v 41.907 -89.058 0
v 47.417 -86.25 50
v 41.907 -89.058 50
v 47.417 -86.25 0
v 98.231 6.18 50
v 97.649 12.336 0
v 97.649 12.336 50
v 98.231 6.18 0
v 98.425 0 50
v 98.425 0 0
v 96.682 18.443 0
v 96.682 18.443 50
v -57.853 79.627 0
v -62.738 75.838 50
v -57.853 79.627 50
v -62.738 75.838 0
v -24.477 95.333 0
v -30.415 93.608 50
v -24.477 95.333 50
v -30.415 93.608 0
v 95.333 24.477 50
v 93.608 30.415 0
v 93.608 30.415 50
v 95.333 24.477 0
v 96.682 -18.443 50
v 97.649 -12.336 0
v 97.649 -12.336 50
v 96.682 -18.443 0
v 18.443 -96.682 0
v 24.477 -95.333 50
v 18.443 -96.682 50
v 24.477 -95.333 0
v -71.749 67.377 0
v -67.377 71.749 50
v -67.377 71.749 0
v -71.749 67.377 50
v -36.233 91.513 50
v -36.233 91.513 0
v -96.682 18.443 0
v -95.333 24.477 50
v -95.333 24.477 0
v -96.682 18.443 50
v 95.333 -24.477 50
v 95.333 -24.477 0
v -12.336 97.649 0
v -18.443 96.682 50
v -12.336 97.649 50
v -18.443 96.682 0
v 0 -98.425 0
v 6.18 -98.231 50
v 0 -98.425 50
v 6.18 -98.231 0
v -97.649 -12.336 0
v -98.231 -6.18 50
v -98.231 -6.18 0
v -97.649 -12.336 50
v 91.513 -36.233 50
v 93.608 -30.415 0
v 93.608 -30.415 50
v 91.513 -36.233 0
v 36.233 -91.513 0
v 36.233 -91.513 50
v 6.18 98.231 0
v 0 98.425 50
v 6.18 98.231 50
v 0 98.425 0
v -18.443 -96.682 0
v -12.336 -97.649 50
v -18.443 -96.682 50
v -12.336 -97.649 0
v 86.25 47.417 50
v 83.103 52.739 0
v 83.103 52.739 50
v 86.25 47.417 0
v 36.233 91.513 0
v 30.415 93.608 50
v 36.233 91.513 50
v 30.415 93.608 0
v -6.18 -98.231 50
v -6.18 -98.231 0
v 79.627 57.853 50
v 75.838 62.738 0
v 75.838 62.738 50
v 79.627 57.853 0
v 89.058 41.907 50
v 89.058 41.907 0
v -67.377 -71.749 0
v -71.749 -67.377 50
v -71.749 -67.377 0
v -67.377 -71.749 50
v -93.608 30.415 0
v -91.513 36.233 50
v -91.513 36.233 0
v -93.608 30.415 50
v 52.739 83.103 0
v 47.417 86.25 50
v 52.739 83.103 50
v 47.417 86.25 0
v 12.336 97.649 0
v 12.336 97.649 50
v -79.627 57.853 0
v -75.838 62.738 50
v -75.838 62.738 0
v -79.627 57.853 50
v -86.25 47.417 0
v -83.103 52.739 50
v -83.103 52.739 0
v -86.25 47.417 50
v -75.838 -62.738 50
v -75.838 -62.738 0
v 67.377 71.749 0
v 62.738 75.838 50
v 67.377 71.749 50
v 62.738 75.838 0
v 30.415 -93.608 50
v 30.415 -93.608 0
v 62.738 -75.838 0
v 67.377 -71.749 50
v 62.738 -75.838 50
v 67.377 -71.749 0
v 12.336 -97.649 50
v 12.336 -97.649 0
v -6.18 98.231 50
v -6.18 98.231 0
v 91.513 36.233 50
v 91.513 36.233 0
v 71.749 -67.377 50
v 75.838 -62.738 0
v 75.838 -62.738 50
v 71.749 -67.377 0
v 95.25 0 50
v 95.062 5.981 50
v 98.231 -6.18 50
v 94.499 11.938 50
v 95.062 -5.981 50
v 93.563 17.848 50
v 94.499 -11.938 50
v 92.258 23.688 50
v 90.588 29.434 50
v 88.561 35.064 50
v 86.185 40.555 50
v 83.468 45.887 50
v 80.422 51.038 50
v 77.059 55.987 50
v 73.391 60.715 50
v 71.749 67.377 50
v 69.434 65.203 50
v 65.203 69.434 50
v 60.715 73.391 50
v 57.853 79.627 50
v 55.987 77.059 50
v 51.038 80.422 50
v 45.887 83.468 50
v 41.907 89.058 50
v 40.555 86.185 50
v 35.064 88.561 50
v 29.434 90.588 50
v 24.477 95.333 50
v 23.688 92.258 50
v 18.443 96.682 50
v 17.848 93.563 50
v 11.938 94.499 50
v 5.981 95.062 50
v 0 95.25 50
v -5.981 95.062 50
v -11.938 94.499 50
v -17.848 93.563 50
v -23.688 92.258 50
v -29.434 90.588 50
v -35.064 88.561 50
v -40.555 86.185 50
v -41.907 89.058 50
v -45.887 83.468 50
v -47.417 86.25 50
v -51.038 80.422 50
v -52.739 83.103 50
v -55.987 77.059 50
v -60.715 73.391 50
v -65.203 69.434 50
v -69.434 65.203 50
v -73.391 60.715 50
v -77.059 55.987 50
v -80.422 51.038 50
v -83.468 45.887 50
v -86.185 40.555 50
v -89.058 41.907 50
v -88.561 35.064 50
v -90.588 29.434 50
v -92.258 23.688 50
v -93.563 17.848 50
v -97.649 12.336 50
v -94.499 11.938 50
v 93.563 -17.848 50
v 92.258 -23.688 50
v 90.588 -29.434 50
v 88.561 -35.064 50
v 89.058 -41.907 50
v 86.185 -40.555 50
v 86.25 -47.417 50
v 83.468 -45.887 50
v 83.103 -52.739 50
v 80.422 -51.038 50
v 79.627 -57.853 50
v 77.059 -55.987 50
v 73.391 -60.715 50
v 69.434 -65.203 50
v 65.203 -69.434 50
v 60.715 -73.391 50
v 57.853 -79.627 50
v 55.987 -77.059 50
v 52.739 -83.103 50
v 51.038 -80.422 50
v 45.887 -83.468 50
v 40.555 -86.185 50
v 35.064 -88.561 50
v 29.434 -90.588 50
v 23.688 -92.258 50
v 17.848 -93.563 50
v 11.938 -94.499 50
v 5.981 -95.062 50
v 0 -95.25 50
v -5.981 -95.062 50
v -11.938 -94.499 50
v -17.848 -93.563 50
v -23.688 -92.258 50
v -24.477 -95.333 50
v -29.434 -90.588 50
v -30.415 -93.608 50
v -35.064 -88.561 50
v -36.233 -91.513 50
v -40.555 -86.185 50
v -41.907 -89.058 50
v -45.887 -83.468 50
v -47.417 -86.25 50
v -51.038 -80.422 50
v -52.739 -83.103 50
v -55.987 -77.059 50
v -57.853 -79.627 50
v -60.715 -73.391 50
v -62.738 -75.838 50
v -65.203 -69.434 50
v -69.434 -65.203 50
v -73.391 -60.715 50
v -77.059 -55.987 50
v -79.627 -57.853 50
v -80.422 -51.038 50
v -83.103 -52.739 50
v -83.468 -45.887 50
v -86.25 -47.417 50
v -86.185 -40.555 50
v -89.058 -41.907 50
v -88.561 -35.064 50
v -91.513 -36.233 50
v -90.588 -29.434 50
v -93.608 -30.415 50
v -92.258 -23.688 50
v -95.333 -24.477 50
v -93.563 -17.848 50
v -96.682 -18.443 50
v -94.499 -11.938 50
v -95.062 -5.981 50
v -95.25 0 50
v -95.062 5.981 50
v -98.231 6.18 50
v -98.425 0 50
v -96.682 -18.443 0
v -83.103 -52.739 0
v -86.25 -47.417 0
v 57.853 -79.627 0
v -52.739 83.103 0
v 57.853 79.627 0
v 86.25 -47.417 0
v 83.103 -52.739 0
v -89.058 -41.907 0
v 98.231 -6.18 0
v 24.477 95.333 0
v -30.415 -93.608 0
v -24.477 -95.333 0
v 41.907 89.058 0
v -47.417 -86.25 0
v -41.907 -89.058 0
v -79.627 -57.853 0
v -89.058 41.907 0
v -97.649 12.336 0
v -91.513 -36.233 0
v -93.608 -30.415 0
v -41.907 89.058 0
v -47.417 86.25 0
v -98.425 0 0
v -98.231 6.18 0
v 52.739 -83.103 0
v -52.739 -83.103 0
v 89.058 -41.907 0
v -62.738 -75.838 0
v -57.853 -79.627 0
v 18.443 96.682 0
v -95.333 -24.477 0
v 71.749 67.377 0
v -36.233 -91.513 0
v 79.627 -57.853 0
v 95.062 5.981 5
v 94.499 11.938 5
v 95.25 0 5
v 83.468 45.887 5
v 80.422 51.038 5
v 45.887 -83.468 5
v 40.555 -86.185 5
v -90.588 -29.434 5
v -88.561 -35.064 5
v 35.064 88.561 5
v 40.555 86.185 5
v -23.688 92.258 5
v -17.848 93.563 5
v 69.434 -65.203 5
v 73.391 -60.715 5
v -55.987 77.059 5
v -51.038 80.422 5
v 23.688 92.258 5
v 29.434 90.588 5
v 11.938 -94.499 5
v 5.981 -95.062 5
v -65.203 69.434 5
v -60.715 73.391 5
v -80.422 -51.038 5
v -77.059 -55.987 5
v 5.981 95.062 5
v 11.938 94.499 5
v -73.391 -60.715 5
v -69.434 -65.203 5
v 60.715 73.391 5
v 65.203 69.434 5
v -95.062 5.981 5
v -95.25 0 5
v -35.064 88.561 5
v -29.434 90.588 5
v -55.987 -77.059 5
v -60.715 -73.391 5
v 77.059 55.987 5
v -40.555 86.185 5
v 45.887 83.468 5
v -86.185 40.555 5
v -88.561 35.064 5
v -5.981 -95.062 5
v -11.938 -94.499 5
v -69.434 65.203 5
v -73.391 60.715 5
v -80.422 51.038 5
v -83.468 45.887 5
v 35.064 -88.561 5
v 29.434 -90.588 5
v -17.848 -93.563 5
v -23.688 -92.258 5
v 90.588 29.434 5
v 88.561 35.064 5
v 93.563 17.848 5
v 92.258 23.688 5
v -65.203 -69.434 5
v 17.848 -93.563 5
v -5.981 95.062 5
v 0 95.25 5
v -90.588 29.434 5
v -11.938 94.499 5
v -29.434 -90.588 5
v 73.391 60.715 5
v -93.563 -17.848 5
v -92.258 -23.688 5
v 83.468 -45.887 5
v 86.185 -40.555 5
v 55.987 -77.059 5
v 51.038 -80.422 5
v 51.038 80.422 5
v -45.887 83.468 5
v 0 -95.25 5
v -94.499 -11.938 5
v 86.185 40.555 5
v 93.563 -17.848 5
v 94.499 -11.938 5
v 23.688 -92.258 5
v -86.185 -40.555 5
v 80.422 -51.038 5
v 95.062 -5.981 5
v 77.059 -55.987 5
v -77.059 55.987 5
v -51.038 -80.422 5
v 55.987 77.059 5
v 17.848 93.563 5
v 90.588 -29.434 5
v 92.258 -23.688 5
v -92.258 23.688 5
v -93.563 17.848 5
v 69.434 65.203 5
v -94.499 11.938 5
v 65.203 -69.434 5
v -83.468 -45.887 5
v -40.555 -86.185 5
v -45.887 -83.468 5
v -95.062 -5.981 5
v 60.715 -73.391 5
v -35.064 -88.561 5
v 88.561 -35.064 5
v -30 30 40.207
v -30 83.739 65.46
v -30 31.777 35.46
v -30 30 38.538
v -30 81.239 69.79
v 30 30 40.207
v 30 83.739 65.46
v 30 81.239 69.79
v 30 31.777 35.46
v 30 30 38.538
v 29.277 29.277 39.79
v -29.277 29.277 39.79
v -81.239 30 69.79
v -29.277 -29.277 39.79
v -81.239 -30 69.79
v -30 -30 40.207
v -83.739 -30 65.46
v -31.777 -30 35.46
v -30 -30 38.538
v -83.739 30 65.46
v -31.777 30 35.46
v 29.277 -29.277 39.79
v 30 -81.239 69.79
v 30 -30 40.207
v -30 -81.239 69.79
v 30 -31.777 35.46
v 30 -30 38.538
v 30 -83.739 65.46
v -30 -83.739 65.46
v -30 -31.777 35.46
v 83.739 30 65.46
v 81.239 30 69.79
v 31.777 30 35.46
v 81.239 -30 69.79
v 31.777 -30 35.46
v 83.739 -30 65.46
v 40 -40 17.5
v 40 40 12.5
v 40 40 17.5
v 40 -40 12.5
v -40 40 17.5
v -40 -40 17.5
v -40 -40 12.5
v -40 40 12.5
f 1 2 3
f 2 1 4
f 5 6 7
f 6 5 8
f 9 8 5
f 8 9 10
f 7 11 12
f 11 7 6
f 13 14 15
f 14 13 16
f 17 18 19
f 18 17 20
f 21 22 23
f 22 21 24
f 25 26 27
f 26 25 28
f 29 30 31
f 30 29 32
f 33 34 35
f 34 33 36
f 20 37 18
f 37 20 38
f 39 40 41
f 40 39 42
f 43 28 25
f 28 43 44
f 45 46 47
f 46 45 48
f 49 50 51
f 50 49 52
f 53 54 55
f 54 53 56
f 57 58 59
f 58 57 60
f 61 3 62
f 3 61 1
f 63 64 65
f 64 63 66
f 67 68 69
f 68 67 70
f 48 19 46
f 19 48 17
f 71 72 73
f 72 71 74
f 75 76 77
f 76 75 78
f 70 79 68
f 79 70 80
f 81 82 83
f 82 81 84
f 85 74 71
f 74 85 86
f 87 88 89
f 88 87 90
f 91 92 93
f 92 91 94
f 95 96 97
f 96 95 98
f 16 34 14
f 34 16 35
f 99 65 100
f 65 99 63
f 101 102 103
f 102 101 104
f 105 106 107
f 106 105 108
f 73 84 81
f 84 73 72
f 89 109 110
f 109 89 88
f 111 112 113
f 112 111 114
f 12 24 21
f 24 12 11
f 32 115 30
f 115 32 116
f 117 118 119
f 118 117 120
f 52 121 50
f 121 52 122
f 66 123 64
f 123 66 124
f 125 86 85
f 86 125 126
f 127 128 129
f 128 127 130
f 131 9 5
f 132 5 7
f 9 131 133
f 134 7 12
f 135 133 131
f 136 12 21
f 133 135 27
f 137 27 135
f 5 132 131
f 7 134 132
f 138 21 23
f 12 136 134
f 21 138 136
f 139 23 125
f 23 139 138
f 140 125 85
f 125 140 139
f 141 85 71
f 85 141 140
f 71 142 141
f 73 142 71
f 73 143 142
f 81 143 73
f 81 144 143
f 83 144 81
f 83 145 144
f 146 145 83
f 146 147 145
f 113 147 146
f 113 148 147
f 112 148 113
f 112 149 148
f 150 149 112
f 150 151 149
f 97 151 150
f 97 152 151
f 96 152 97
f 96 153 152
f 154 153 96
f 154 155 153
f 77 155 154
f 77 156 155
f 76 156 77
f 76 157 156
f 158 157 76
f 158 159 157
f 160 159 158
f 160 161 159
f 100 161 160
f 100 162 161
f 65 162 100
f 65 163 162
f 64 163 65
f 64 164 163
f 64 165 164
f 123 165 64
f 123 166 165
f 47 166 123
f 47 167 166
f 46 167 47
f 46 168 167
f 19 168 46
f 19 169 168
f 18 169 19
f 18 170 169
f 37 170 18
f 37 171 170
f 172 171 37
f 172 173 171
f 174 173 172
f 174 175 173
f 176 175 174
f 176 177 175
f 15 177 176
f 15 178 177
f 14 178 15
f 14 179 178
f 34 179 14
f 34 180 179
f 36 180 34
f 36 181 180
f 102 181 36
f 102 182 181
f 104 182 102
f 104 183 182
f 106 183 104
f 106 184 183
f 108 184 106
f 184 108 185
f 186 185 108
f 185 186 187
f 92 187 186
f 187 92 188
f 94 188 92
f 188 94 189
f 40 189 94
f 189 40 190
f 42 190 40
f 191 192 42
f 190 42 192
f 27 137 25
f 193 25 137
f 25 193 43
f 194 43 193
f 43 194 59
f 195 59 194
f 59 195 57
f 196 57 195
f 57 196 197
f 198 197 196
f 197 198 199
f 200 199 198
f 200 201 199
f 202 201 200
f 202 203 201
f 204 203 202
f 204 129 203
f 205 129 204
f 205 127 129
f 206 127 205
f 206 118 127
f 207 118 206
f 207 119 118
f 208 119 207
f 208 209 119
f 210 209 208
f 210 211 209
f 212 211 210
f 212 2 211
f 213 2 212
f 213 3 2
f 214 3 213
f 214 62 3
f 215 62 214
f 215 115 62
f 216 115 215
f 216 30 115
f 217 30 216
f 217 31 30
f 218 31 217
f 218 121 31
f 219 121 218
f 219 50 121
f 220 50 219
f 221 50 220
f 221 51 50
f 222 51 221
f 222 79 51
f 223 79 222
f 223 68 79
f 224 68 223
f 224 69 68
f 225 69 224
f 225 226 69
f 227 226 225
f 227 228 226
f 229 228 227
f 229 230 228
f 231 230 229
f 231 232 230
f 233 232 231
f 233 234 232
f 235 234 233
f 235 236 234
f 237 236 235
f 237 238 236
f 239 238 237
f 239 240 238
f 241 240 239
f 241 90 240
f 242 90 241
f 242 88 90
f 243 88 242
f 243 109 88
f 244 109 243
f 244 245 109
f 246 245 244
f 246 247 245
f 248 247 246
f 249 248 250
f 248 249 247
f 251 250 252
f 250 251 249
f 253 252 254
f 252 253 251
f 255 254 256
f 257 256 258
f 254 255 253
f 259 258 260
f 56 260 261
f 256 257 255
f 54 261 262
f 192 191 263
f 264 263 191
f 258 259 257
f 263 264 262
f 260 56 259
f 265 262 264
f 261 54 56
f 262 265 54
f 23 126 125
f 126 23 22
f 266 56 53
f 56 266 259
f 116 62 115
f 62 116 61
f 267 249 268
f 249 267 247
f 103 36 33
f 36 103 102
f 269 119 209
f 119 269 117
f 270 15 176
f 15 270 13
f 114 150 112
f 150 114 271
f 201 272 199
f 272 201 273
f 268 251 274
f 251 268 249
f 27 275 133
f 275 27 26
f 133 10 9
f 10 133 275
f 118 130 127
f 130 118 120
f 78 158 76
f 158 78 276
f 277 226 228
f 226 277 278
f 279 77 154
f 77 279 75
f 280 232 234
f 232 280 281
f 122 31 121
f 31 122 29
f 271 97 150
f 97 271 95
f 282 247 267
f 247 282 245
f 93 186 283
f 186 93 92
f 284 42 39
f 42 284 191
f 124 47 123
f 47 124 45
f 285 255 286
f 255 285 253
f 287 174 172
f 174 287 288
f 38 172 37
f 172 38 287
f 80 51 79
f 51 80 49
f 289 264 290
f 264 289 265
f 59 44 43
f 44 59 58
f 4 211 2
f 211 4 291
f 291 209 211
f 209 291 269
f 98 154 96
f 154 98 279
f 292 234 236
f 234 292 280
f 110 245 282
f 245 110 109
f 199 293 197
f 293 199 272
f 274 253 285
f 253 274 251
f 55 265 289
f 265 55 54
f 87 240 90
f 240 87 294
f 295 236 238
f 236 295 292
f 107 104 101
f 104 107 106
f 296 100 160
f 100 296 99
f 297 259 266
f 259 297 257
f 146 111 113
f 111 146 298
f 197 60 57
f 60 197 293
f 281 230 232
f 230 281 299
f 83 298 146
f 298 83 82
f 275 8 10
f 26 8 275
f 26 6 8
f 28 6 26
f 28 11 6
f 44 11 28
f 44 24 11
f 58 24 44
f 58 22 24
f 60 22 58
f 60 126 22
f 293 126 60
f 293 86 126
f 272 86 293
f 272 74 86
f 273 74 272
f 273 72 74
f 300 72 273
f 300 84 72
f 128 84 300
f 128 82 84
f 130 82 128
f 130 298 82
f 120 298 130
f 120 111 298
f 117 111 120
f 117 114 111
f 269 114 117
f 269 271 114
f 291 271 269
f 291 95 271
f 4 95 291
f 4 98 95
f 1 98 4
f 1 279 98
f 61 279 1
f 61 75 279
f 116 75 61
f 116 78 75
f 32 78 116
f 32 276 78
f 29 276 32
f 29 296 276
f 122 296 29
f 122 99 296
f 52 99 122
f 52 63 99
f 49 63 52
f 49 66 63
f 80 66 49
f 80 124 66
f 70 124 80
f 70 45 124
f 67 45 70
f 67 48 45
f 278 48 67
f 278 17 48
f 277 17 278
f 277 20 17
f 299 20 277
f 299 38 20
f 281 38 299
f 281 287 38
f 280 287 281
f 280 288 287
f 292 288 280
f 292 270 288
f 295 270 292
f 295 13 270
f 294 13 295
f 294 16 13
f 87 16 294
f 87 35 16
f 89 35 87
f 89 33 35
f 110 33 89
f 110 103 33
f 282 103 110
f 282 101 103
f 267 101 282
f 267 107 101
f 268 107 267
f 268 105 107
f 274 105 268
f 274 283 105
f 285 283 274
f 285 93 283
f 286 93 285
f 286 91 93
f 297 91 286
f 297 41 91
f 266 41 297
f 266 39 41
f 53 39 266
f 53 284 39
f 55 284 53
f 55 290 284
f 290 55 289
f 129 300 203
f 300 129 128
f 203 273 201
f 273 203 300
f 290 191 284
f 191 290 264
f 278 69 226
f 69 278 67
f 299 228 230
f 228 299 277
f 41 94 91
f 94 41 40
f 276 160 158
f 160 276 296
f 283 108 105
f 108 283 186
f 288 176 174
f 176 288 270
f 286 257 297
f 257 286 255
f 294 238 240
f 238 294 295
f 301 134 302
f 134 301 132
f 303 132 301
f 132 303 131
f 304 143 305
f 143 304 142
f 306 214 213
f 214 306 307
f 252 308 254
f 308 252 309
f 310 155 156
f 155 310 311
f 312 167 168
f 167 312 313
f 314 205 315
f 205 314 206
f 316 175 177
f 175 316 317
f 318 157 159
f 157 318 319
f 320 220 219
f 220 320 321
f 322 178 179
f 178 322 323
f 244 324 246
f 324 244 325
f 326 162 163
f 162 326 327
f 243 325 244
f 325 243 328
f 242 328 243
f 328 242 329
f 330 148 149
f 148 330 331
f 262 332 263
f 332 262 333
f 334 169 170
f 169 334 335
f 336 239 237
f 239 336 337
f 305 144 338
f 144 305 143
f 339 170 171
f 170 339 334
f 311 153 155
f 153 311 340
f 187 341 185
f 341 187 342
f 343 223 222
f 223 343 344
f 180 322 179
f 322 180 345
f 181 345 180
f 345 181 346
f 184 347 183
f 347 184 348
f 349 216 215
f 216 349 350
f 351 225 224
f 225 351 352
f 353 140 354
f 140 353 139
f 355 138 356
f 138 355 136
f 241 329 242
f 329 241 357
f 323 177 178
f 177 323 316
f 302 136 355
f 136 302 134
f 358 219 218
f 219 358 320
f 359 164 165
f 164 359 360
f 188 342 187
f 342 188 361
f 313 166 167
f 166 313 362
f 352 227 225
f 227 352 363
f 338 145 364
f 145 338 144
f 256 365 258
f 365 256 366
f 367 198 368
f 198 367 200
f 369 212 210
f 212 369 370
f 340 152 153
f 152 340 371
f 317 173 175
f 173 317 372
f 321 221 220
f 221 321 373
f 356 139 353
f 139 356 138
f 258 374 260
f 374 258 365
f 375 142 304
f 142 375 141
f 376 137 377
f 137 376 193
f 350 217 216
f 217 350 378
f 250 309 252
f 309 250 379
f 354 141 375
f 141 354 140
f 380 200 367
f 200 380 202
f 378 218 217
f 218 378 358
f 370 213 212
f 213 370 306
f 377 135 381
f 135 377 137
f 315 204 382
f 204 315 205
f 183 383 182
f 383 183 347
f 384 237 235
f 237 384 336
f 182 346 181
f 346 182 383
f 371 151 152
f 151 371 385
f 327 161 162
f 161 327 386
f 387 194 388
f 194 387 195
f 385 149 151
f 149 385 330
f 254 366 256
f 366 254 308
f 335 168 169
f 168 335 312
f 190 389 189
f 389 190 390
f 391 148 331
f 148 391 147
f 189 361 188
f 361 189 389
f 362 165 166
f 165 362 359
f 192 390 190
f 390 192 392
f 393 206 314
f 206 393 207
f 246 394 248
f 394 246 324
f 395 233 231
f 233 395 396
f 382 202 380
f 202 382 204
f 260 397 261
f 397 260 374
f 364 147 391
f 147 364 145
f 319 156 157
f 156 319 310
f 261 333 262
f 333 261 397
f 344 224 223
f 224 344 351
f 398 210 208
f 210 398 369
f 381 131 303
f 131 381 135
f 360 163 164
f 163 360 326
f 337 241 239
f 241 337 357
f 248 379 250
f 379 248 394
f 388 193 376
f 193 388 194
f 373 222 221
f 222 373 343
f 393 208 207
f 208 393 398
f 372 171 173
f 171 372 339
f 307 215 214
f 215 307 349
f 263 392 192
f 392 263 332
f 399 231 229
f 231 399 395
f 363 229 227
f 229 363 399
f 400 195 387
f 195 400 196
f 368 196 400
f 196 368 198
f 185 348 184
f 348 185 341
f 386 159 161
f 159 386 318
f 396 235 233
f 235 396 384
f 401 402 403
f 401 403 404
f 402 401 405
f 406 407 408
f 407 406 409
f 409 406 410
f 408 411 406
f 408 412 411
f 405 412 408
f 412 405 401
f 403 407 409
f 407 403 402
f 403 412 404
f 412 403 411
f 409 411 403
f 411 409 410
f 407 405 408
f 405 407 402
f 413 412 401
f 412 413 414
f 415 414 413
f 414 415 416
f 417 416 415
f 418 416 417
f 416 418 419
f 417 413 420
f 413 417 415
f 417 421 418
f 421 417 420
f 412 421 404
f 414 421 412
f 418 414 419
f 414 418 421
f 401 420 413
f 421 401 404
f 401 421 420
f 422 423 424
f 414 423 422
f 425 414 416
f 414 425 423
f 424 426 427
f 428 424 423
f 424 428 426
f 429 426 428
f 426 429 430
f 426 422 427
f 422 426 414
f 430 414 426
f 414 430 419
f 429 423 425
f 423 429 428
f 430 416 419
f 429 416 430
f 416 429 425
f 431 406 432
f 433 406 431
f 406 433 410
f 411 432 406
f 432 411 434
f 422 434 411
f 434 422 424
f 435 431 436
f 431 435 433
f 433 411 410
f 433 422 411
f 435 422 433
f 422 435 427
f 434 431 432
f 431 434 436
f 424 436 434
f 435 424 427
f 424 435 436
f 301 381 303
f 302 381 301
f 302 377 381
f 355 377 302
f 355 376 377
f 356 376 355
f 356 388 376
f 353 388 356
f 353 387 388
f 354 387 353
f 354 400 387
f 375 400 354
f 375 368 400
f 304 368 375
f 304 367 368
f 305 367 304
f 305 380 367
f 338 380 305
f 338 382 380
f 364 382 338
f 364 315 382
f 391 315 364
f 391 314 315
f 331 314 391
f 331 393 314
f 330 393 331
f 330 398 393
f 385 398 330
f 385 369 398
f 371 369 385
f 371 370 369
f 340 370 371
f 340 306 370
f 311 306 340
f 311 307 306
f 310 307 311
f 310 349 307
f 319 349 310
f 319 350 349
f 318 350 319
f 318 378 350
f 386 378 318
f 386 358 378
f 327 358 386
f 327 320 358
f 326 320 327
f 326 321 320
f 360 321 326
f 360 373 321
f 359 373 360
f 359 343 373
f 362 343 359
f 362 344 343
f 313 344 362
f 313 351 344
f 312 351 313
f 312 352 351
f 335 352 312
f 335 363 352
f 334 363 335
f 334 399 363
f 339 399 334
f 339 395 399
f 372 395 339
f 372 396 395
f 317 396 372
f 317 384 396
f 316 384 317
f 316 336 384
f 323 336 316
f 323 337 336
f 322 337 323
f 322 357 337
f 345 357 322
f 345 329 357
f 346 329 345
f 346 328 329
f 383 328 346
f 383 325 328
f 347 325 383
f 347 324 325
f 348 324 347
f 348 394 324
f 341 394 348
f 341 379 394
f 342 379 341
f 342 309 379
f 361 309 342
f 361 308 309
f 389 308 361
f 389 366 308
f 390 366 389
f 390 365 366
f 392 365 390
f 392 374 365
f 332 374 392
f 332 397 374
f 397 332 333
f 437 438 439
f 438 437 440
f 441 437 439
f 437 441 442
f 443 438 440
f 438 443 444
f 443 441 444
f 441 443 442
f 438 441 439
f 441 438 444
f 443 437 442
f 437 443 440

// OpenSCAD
$fn=100;

in=25.4;
z=5;

diam=7.5*in;
echo(diam);

cylinder(5,d=diam);
difference(){
    cylinder(50,d=diam+in/4);
    cylinder(500,d=diam);
}

colors=["blue","gray","black","green"];

color("red")
translate([0,0,15])
cube([80,80,5],center=true);


for(i=[0:3]){
    color(colors[i])
    translate([0,0,20])
    rotate([30,0,i*90])
    translate([0,diam/2-30,0])
    cube([60,60,5],center=true);
}
